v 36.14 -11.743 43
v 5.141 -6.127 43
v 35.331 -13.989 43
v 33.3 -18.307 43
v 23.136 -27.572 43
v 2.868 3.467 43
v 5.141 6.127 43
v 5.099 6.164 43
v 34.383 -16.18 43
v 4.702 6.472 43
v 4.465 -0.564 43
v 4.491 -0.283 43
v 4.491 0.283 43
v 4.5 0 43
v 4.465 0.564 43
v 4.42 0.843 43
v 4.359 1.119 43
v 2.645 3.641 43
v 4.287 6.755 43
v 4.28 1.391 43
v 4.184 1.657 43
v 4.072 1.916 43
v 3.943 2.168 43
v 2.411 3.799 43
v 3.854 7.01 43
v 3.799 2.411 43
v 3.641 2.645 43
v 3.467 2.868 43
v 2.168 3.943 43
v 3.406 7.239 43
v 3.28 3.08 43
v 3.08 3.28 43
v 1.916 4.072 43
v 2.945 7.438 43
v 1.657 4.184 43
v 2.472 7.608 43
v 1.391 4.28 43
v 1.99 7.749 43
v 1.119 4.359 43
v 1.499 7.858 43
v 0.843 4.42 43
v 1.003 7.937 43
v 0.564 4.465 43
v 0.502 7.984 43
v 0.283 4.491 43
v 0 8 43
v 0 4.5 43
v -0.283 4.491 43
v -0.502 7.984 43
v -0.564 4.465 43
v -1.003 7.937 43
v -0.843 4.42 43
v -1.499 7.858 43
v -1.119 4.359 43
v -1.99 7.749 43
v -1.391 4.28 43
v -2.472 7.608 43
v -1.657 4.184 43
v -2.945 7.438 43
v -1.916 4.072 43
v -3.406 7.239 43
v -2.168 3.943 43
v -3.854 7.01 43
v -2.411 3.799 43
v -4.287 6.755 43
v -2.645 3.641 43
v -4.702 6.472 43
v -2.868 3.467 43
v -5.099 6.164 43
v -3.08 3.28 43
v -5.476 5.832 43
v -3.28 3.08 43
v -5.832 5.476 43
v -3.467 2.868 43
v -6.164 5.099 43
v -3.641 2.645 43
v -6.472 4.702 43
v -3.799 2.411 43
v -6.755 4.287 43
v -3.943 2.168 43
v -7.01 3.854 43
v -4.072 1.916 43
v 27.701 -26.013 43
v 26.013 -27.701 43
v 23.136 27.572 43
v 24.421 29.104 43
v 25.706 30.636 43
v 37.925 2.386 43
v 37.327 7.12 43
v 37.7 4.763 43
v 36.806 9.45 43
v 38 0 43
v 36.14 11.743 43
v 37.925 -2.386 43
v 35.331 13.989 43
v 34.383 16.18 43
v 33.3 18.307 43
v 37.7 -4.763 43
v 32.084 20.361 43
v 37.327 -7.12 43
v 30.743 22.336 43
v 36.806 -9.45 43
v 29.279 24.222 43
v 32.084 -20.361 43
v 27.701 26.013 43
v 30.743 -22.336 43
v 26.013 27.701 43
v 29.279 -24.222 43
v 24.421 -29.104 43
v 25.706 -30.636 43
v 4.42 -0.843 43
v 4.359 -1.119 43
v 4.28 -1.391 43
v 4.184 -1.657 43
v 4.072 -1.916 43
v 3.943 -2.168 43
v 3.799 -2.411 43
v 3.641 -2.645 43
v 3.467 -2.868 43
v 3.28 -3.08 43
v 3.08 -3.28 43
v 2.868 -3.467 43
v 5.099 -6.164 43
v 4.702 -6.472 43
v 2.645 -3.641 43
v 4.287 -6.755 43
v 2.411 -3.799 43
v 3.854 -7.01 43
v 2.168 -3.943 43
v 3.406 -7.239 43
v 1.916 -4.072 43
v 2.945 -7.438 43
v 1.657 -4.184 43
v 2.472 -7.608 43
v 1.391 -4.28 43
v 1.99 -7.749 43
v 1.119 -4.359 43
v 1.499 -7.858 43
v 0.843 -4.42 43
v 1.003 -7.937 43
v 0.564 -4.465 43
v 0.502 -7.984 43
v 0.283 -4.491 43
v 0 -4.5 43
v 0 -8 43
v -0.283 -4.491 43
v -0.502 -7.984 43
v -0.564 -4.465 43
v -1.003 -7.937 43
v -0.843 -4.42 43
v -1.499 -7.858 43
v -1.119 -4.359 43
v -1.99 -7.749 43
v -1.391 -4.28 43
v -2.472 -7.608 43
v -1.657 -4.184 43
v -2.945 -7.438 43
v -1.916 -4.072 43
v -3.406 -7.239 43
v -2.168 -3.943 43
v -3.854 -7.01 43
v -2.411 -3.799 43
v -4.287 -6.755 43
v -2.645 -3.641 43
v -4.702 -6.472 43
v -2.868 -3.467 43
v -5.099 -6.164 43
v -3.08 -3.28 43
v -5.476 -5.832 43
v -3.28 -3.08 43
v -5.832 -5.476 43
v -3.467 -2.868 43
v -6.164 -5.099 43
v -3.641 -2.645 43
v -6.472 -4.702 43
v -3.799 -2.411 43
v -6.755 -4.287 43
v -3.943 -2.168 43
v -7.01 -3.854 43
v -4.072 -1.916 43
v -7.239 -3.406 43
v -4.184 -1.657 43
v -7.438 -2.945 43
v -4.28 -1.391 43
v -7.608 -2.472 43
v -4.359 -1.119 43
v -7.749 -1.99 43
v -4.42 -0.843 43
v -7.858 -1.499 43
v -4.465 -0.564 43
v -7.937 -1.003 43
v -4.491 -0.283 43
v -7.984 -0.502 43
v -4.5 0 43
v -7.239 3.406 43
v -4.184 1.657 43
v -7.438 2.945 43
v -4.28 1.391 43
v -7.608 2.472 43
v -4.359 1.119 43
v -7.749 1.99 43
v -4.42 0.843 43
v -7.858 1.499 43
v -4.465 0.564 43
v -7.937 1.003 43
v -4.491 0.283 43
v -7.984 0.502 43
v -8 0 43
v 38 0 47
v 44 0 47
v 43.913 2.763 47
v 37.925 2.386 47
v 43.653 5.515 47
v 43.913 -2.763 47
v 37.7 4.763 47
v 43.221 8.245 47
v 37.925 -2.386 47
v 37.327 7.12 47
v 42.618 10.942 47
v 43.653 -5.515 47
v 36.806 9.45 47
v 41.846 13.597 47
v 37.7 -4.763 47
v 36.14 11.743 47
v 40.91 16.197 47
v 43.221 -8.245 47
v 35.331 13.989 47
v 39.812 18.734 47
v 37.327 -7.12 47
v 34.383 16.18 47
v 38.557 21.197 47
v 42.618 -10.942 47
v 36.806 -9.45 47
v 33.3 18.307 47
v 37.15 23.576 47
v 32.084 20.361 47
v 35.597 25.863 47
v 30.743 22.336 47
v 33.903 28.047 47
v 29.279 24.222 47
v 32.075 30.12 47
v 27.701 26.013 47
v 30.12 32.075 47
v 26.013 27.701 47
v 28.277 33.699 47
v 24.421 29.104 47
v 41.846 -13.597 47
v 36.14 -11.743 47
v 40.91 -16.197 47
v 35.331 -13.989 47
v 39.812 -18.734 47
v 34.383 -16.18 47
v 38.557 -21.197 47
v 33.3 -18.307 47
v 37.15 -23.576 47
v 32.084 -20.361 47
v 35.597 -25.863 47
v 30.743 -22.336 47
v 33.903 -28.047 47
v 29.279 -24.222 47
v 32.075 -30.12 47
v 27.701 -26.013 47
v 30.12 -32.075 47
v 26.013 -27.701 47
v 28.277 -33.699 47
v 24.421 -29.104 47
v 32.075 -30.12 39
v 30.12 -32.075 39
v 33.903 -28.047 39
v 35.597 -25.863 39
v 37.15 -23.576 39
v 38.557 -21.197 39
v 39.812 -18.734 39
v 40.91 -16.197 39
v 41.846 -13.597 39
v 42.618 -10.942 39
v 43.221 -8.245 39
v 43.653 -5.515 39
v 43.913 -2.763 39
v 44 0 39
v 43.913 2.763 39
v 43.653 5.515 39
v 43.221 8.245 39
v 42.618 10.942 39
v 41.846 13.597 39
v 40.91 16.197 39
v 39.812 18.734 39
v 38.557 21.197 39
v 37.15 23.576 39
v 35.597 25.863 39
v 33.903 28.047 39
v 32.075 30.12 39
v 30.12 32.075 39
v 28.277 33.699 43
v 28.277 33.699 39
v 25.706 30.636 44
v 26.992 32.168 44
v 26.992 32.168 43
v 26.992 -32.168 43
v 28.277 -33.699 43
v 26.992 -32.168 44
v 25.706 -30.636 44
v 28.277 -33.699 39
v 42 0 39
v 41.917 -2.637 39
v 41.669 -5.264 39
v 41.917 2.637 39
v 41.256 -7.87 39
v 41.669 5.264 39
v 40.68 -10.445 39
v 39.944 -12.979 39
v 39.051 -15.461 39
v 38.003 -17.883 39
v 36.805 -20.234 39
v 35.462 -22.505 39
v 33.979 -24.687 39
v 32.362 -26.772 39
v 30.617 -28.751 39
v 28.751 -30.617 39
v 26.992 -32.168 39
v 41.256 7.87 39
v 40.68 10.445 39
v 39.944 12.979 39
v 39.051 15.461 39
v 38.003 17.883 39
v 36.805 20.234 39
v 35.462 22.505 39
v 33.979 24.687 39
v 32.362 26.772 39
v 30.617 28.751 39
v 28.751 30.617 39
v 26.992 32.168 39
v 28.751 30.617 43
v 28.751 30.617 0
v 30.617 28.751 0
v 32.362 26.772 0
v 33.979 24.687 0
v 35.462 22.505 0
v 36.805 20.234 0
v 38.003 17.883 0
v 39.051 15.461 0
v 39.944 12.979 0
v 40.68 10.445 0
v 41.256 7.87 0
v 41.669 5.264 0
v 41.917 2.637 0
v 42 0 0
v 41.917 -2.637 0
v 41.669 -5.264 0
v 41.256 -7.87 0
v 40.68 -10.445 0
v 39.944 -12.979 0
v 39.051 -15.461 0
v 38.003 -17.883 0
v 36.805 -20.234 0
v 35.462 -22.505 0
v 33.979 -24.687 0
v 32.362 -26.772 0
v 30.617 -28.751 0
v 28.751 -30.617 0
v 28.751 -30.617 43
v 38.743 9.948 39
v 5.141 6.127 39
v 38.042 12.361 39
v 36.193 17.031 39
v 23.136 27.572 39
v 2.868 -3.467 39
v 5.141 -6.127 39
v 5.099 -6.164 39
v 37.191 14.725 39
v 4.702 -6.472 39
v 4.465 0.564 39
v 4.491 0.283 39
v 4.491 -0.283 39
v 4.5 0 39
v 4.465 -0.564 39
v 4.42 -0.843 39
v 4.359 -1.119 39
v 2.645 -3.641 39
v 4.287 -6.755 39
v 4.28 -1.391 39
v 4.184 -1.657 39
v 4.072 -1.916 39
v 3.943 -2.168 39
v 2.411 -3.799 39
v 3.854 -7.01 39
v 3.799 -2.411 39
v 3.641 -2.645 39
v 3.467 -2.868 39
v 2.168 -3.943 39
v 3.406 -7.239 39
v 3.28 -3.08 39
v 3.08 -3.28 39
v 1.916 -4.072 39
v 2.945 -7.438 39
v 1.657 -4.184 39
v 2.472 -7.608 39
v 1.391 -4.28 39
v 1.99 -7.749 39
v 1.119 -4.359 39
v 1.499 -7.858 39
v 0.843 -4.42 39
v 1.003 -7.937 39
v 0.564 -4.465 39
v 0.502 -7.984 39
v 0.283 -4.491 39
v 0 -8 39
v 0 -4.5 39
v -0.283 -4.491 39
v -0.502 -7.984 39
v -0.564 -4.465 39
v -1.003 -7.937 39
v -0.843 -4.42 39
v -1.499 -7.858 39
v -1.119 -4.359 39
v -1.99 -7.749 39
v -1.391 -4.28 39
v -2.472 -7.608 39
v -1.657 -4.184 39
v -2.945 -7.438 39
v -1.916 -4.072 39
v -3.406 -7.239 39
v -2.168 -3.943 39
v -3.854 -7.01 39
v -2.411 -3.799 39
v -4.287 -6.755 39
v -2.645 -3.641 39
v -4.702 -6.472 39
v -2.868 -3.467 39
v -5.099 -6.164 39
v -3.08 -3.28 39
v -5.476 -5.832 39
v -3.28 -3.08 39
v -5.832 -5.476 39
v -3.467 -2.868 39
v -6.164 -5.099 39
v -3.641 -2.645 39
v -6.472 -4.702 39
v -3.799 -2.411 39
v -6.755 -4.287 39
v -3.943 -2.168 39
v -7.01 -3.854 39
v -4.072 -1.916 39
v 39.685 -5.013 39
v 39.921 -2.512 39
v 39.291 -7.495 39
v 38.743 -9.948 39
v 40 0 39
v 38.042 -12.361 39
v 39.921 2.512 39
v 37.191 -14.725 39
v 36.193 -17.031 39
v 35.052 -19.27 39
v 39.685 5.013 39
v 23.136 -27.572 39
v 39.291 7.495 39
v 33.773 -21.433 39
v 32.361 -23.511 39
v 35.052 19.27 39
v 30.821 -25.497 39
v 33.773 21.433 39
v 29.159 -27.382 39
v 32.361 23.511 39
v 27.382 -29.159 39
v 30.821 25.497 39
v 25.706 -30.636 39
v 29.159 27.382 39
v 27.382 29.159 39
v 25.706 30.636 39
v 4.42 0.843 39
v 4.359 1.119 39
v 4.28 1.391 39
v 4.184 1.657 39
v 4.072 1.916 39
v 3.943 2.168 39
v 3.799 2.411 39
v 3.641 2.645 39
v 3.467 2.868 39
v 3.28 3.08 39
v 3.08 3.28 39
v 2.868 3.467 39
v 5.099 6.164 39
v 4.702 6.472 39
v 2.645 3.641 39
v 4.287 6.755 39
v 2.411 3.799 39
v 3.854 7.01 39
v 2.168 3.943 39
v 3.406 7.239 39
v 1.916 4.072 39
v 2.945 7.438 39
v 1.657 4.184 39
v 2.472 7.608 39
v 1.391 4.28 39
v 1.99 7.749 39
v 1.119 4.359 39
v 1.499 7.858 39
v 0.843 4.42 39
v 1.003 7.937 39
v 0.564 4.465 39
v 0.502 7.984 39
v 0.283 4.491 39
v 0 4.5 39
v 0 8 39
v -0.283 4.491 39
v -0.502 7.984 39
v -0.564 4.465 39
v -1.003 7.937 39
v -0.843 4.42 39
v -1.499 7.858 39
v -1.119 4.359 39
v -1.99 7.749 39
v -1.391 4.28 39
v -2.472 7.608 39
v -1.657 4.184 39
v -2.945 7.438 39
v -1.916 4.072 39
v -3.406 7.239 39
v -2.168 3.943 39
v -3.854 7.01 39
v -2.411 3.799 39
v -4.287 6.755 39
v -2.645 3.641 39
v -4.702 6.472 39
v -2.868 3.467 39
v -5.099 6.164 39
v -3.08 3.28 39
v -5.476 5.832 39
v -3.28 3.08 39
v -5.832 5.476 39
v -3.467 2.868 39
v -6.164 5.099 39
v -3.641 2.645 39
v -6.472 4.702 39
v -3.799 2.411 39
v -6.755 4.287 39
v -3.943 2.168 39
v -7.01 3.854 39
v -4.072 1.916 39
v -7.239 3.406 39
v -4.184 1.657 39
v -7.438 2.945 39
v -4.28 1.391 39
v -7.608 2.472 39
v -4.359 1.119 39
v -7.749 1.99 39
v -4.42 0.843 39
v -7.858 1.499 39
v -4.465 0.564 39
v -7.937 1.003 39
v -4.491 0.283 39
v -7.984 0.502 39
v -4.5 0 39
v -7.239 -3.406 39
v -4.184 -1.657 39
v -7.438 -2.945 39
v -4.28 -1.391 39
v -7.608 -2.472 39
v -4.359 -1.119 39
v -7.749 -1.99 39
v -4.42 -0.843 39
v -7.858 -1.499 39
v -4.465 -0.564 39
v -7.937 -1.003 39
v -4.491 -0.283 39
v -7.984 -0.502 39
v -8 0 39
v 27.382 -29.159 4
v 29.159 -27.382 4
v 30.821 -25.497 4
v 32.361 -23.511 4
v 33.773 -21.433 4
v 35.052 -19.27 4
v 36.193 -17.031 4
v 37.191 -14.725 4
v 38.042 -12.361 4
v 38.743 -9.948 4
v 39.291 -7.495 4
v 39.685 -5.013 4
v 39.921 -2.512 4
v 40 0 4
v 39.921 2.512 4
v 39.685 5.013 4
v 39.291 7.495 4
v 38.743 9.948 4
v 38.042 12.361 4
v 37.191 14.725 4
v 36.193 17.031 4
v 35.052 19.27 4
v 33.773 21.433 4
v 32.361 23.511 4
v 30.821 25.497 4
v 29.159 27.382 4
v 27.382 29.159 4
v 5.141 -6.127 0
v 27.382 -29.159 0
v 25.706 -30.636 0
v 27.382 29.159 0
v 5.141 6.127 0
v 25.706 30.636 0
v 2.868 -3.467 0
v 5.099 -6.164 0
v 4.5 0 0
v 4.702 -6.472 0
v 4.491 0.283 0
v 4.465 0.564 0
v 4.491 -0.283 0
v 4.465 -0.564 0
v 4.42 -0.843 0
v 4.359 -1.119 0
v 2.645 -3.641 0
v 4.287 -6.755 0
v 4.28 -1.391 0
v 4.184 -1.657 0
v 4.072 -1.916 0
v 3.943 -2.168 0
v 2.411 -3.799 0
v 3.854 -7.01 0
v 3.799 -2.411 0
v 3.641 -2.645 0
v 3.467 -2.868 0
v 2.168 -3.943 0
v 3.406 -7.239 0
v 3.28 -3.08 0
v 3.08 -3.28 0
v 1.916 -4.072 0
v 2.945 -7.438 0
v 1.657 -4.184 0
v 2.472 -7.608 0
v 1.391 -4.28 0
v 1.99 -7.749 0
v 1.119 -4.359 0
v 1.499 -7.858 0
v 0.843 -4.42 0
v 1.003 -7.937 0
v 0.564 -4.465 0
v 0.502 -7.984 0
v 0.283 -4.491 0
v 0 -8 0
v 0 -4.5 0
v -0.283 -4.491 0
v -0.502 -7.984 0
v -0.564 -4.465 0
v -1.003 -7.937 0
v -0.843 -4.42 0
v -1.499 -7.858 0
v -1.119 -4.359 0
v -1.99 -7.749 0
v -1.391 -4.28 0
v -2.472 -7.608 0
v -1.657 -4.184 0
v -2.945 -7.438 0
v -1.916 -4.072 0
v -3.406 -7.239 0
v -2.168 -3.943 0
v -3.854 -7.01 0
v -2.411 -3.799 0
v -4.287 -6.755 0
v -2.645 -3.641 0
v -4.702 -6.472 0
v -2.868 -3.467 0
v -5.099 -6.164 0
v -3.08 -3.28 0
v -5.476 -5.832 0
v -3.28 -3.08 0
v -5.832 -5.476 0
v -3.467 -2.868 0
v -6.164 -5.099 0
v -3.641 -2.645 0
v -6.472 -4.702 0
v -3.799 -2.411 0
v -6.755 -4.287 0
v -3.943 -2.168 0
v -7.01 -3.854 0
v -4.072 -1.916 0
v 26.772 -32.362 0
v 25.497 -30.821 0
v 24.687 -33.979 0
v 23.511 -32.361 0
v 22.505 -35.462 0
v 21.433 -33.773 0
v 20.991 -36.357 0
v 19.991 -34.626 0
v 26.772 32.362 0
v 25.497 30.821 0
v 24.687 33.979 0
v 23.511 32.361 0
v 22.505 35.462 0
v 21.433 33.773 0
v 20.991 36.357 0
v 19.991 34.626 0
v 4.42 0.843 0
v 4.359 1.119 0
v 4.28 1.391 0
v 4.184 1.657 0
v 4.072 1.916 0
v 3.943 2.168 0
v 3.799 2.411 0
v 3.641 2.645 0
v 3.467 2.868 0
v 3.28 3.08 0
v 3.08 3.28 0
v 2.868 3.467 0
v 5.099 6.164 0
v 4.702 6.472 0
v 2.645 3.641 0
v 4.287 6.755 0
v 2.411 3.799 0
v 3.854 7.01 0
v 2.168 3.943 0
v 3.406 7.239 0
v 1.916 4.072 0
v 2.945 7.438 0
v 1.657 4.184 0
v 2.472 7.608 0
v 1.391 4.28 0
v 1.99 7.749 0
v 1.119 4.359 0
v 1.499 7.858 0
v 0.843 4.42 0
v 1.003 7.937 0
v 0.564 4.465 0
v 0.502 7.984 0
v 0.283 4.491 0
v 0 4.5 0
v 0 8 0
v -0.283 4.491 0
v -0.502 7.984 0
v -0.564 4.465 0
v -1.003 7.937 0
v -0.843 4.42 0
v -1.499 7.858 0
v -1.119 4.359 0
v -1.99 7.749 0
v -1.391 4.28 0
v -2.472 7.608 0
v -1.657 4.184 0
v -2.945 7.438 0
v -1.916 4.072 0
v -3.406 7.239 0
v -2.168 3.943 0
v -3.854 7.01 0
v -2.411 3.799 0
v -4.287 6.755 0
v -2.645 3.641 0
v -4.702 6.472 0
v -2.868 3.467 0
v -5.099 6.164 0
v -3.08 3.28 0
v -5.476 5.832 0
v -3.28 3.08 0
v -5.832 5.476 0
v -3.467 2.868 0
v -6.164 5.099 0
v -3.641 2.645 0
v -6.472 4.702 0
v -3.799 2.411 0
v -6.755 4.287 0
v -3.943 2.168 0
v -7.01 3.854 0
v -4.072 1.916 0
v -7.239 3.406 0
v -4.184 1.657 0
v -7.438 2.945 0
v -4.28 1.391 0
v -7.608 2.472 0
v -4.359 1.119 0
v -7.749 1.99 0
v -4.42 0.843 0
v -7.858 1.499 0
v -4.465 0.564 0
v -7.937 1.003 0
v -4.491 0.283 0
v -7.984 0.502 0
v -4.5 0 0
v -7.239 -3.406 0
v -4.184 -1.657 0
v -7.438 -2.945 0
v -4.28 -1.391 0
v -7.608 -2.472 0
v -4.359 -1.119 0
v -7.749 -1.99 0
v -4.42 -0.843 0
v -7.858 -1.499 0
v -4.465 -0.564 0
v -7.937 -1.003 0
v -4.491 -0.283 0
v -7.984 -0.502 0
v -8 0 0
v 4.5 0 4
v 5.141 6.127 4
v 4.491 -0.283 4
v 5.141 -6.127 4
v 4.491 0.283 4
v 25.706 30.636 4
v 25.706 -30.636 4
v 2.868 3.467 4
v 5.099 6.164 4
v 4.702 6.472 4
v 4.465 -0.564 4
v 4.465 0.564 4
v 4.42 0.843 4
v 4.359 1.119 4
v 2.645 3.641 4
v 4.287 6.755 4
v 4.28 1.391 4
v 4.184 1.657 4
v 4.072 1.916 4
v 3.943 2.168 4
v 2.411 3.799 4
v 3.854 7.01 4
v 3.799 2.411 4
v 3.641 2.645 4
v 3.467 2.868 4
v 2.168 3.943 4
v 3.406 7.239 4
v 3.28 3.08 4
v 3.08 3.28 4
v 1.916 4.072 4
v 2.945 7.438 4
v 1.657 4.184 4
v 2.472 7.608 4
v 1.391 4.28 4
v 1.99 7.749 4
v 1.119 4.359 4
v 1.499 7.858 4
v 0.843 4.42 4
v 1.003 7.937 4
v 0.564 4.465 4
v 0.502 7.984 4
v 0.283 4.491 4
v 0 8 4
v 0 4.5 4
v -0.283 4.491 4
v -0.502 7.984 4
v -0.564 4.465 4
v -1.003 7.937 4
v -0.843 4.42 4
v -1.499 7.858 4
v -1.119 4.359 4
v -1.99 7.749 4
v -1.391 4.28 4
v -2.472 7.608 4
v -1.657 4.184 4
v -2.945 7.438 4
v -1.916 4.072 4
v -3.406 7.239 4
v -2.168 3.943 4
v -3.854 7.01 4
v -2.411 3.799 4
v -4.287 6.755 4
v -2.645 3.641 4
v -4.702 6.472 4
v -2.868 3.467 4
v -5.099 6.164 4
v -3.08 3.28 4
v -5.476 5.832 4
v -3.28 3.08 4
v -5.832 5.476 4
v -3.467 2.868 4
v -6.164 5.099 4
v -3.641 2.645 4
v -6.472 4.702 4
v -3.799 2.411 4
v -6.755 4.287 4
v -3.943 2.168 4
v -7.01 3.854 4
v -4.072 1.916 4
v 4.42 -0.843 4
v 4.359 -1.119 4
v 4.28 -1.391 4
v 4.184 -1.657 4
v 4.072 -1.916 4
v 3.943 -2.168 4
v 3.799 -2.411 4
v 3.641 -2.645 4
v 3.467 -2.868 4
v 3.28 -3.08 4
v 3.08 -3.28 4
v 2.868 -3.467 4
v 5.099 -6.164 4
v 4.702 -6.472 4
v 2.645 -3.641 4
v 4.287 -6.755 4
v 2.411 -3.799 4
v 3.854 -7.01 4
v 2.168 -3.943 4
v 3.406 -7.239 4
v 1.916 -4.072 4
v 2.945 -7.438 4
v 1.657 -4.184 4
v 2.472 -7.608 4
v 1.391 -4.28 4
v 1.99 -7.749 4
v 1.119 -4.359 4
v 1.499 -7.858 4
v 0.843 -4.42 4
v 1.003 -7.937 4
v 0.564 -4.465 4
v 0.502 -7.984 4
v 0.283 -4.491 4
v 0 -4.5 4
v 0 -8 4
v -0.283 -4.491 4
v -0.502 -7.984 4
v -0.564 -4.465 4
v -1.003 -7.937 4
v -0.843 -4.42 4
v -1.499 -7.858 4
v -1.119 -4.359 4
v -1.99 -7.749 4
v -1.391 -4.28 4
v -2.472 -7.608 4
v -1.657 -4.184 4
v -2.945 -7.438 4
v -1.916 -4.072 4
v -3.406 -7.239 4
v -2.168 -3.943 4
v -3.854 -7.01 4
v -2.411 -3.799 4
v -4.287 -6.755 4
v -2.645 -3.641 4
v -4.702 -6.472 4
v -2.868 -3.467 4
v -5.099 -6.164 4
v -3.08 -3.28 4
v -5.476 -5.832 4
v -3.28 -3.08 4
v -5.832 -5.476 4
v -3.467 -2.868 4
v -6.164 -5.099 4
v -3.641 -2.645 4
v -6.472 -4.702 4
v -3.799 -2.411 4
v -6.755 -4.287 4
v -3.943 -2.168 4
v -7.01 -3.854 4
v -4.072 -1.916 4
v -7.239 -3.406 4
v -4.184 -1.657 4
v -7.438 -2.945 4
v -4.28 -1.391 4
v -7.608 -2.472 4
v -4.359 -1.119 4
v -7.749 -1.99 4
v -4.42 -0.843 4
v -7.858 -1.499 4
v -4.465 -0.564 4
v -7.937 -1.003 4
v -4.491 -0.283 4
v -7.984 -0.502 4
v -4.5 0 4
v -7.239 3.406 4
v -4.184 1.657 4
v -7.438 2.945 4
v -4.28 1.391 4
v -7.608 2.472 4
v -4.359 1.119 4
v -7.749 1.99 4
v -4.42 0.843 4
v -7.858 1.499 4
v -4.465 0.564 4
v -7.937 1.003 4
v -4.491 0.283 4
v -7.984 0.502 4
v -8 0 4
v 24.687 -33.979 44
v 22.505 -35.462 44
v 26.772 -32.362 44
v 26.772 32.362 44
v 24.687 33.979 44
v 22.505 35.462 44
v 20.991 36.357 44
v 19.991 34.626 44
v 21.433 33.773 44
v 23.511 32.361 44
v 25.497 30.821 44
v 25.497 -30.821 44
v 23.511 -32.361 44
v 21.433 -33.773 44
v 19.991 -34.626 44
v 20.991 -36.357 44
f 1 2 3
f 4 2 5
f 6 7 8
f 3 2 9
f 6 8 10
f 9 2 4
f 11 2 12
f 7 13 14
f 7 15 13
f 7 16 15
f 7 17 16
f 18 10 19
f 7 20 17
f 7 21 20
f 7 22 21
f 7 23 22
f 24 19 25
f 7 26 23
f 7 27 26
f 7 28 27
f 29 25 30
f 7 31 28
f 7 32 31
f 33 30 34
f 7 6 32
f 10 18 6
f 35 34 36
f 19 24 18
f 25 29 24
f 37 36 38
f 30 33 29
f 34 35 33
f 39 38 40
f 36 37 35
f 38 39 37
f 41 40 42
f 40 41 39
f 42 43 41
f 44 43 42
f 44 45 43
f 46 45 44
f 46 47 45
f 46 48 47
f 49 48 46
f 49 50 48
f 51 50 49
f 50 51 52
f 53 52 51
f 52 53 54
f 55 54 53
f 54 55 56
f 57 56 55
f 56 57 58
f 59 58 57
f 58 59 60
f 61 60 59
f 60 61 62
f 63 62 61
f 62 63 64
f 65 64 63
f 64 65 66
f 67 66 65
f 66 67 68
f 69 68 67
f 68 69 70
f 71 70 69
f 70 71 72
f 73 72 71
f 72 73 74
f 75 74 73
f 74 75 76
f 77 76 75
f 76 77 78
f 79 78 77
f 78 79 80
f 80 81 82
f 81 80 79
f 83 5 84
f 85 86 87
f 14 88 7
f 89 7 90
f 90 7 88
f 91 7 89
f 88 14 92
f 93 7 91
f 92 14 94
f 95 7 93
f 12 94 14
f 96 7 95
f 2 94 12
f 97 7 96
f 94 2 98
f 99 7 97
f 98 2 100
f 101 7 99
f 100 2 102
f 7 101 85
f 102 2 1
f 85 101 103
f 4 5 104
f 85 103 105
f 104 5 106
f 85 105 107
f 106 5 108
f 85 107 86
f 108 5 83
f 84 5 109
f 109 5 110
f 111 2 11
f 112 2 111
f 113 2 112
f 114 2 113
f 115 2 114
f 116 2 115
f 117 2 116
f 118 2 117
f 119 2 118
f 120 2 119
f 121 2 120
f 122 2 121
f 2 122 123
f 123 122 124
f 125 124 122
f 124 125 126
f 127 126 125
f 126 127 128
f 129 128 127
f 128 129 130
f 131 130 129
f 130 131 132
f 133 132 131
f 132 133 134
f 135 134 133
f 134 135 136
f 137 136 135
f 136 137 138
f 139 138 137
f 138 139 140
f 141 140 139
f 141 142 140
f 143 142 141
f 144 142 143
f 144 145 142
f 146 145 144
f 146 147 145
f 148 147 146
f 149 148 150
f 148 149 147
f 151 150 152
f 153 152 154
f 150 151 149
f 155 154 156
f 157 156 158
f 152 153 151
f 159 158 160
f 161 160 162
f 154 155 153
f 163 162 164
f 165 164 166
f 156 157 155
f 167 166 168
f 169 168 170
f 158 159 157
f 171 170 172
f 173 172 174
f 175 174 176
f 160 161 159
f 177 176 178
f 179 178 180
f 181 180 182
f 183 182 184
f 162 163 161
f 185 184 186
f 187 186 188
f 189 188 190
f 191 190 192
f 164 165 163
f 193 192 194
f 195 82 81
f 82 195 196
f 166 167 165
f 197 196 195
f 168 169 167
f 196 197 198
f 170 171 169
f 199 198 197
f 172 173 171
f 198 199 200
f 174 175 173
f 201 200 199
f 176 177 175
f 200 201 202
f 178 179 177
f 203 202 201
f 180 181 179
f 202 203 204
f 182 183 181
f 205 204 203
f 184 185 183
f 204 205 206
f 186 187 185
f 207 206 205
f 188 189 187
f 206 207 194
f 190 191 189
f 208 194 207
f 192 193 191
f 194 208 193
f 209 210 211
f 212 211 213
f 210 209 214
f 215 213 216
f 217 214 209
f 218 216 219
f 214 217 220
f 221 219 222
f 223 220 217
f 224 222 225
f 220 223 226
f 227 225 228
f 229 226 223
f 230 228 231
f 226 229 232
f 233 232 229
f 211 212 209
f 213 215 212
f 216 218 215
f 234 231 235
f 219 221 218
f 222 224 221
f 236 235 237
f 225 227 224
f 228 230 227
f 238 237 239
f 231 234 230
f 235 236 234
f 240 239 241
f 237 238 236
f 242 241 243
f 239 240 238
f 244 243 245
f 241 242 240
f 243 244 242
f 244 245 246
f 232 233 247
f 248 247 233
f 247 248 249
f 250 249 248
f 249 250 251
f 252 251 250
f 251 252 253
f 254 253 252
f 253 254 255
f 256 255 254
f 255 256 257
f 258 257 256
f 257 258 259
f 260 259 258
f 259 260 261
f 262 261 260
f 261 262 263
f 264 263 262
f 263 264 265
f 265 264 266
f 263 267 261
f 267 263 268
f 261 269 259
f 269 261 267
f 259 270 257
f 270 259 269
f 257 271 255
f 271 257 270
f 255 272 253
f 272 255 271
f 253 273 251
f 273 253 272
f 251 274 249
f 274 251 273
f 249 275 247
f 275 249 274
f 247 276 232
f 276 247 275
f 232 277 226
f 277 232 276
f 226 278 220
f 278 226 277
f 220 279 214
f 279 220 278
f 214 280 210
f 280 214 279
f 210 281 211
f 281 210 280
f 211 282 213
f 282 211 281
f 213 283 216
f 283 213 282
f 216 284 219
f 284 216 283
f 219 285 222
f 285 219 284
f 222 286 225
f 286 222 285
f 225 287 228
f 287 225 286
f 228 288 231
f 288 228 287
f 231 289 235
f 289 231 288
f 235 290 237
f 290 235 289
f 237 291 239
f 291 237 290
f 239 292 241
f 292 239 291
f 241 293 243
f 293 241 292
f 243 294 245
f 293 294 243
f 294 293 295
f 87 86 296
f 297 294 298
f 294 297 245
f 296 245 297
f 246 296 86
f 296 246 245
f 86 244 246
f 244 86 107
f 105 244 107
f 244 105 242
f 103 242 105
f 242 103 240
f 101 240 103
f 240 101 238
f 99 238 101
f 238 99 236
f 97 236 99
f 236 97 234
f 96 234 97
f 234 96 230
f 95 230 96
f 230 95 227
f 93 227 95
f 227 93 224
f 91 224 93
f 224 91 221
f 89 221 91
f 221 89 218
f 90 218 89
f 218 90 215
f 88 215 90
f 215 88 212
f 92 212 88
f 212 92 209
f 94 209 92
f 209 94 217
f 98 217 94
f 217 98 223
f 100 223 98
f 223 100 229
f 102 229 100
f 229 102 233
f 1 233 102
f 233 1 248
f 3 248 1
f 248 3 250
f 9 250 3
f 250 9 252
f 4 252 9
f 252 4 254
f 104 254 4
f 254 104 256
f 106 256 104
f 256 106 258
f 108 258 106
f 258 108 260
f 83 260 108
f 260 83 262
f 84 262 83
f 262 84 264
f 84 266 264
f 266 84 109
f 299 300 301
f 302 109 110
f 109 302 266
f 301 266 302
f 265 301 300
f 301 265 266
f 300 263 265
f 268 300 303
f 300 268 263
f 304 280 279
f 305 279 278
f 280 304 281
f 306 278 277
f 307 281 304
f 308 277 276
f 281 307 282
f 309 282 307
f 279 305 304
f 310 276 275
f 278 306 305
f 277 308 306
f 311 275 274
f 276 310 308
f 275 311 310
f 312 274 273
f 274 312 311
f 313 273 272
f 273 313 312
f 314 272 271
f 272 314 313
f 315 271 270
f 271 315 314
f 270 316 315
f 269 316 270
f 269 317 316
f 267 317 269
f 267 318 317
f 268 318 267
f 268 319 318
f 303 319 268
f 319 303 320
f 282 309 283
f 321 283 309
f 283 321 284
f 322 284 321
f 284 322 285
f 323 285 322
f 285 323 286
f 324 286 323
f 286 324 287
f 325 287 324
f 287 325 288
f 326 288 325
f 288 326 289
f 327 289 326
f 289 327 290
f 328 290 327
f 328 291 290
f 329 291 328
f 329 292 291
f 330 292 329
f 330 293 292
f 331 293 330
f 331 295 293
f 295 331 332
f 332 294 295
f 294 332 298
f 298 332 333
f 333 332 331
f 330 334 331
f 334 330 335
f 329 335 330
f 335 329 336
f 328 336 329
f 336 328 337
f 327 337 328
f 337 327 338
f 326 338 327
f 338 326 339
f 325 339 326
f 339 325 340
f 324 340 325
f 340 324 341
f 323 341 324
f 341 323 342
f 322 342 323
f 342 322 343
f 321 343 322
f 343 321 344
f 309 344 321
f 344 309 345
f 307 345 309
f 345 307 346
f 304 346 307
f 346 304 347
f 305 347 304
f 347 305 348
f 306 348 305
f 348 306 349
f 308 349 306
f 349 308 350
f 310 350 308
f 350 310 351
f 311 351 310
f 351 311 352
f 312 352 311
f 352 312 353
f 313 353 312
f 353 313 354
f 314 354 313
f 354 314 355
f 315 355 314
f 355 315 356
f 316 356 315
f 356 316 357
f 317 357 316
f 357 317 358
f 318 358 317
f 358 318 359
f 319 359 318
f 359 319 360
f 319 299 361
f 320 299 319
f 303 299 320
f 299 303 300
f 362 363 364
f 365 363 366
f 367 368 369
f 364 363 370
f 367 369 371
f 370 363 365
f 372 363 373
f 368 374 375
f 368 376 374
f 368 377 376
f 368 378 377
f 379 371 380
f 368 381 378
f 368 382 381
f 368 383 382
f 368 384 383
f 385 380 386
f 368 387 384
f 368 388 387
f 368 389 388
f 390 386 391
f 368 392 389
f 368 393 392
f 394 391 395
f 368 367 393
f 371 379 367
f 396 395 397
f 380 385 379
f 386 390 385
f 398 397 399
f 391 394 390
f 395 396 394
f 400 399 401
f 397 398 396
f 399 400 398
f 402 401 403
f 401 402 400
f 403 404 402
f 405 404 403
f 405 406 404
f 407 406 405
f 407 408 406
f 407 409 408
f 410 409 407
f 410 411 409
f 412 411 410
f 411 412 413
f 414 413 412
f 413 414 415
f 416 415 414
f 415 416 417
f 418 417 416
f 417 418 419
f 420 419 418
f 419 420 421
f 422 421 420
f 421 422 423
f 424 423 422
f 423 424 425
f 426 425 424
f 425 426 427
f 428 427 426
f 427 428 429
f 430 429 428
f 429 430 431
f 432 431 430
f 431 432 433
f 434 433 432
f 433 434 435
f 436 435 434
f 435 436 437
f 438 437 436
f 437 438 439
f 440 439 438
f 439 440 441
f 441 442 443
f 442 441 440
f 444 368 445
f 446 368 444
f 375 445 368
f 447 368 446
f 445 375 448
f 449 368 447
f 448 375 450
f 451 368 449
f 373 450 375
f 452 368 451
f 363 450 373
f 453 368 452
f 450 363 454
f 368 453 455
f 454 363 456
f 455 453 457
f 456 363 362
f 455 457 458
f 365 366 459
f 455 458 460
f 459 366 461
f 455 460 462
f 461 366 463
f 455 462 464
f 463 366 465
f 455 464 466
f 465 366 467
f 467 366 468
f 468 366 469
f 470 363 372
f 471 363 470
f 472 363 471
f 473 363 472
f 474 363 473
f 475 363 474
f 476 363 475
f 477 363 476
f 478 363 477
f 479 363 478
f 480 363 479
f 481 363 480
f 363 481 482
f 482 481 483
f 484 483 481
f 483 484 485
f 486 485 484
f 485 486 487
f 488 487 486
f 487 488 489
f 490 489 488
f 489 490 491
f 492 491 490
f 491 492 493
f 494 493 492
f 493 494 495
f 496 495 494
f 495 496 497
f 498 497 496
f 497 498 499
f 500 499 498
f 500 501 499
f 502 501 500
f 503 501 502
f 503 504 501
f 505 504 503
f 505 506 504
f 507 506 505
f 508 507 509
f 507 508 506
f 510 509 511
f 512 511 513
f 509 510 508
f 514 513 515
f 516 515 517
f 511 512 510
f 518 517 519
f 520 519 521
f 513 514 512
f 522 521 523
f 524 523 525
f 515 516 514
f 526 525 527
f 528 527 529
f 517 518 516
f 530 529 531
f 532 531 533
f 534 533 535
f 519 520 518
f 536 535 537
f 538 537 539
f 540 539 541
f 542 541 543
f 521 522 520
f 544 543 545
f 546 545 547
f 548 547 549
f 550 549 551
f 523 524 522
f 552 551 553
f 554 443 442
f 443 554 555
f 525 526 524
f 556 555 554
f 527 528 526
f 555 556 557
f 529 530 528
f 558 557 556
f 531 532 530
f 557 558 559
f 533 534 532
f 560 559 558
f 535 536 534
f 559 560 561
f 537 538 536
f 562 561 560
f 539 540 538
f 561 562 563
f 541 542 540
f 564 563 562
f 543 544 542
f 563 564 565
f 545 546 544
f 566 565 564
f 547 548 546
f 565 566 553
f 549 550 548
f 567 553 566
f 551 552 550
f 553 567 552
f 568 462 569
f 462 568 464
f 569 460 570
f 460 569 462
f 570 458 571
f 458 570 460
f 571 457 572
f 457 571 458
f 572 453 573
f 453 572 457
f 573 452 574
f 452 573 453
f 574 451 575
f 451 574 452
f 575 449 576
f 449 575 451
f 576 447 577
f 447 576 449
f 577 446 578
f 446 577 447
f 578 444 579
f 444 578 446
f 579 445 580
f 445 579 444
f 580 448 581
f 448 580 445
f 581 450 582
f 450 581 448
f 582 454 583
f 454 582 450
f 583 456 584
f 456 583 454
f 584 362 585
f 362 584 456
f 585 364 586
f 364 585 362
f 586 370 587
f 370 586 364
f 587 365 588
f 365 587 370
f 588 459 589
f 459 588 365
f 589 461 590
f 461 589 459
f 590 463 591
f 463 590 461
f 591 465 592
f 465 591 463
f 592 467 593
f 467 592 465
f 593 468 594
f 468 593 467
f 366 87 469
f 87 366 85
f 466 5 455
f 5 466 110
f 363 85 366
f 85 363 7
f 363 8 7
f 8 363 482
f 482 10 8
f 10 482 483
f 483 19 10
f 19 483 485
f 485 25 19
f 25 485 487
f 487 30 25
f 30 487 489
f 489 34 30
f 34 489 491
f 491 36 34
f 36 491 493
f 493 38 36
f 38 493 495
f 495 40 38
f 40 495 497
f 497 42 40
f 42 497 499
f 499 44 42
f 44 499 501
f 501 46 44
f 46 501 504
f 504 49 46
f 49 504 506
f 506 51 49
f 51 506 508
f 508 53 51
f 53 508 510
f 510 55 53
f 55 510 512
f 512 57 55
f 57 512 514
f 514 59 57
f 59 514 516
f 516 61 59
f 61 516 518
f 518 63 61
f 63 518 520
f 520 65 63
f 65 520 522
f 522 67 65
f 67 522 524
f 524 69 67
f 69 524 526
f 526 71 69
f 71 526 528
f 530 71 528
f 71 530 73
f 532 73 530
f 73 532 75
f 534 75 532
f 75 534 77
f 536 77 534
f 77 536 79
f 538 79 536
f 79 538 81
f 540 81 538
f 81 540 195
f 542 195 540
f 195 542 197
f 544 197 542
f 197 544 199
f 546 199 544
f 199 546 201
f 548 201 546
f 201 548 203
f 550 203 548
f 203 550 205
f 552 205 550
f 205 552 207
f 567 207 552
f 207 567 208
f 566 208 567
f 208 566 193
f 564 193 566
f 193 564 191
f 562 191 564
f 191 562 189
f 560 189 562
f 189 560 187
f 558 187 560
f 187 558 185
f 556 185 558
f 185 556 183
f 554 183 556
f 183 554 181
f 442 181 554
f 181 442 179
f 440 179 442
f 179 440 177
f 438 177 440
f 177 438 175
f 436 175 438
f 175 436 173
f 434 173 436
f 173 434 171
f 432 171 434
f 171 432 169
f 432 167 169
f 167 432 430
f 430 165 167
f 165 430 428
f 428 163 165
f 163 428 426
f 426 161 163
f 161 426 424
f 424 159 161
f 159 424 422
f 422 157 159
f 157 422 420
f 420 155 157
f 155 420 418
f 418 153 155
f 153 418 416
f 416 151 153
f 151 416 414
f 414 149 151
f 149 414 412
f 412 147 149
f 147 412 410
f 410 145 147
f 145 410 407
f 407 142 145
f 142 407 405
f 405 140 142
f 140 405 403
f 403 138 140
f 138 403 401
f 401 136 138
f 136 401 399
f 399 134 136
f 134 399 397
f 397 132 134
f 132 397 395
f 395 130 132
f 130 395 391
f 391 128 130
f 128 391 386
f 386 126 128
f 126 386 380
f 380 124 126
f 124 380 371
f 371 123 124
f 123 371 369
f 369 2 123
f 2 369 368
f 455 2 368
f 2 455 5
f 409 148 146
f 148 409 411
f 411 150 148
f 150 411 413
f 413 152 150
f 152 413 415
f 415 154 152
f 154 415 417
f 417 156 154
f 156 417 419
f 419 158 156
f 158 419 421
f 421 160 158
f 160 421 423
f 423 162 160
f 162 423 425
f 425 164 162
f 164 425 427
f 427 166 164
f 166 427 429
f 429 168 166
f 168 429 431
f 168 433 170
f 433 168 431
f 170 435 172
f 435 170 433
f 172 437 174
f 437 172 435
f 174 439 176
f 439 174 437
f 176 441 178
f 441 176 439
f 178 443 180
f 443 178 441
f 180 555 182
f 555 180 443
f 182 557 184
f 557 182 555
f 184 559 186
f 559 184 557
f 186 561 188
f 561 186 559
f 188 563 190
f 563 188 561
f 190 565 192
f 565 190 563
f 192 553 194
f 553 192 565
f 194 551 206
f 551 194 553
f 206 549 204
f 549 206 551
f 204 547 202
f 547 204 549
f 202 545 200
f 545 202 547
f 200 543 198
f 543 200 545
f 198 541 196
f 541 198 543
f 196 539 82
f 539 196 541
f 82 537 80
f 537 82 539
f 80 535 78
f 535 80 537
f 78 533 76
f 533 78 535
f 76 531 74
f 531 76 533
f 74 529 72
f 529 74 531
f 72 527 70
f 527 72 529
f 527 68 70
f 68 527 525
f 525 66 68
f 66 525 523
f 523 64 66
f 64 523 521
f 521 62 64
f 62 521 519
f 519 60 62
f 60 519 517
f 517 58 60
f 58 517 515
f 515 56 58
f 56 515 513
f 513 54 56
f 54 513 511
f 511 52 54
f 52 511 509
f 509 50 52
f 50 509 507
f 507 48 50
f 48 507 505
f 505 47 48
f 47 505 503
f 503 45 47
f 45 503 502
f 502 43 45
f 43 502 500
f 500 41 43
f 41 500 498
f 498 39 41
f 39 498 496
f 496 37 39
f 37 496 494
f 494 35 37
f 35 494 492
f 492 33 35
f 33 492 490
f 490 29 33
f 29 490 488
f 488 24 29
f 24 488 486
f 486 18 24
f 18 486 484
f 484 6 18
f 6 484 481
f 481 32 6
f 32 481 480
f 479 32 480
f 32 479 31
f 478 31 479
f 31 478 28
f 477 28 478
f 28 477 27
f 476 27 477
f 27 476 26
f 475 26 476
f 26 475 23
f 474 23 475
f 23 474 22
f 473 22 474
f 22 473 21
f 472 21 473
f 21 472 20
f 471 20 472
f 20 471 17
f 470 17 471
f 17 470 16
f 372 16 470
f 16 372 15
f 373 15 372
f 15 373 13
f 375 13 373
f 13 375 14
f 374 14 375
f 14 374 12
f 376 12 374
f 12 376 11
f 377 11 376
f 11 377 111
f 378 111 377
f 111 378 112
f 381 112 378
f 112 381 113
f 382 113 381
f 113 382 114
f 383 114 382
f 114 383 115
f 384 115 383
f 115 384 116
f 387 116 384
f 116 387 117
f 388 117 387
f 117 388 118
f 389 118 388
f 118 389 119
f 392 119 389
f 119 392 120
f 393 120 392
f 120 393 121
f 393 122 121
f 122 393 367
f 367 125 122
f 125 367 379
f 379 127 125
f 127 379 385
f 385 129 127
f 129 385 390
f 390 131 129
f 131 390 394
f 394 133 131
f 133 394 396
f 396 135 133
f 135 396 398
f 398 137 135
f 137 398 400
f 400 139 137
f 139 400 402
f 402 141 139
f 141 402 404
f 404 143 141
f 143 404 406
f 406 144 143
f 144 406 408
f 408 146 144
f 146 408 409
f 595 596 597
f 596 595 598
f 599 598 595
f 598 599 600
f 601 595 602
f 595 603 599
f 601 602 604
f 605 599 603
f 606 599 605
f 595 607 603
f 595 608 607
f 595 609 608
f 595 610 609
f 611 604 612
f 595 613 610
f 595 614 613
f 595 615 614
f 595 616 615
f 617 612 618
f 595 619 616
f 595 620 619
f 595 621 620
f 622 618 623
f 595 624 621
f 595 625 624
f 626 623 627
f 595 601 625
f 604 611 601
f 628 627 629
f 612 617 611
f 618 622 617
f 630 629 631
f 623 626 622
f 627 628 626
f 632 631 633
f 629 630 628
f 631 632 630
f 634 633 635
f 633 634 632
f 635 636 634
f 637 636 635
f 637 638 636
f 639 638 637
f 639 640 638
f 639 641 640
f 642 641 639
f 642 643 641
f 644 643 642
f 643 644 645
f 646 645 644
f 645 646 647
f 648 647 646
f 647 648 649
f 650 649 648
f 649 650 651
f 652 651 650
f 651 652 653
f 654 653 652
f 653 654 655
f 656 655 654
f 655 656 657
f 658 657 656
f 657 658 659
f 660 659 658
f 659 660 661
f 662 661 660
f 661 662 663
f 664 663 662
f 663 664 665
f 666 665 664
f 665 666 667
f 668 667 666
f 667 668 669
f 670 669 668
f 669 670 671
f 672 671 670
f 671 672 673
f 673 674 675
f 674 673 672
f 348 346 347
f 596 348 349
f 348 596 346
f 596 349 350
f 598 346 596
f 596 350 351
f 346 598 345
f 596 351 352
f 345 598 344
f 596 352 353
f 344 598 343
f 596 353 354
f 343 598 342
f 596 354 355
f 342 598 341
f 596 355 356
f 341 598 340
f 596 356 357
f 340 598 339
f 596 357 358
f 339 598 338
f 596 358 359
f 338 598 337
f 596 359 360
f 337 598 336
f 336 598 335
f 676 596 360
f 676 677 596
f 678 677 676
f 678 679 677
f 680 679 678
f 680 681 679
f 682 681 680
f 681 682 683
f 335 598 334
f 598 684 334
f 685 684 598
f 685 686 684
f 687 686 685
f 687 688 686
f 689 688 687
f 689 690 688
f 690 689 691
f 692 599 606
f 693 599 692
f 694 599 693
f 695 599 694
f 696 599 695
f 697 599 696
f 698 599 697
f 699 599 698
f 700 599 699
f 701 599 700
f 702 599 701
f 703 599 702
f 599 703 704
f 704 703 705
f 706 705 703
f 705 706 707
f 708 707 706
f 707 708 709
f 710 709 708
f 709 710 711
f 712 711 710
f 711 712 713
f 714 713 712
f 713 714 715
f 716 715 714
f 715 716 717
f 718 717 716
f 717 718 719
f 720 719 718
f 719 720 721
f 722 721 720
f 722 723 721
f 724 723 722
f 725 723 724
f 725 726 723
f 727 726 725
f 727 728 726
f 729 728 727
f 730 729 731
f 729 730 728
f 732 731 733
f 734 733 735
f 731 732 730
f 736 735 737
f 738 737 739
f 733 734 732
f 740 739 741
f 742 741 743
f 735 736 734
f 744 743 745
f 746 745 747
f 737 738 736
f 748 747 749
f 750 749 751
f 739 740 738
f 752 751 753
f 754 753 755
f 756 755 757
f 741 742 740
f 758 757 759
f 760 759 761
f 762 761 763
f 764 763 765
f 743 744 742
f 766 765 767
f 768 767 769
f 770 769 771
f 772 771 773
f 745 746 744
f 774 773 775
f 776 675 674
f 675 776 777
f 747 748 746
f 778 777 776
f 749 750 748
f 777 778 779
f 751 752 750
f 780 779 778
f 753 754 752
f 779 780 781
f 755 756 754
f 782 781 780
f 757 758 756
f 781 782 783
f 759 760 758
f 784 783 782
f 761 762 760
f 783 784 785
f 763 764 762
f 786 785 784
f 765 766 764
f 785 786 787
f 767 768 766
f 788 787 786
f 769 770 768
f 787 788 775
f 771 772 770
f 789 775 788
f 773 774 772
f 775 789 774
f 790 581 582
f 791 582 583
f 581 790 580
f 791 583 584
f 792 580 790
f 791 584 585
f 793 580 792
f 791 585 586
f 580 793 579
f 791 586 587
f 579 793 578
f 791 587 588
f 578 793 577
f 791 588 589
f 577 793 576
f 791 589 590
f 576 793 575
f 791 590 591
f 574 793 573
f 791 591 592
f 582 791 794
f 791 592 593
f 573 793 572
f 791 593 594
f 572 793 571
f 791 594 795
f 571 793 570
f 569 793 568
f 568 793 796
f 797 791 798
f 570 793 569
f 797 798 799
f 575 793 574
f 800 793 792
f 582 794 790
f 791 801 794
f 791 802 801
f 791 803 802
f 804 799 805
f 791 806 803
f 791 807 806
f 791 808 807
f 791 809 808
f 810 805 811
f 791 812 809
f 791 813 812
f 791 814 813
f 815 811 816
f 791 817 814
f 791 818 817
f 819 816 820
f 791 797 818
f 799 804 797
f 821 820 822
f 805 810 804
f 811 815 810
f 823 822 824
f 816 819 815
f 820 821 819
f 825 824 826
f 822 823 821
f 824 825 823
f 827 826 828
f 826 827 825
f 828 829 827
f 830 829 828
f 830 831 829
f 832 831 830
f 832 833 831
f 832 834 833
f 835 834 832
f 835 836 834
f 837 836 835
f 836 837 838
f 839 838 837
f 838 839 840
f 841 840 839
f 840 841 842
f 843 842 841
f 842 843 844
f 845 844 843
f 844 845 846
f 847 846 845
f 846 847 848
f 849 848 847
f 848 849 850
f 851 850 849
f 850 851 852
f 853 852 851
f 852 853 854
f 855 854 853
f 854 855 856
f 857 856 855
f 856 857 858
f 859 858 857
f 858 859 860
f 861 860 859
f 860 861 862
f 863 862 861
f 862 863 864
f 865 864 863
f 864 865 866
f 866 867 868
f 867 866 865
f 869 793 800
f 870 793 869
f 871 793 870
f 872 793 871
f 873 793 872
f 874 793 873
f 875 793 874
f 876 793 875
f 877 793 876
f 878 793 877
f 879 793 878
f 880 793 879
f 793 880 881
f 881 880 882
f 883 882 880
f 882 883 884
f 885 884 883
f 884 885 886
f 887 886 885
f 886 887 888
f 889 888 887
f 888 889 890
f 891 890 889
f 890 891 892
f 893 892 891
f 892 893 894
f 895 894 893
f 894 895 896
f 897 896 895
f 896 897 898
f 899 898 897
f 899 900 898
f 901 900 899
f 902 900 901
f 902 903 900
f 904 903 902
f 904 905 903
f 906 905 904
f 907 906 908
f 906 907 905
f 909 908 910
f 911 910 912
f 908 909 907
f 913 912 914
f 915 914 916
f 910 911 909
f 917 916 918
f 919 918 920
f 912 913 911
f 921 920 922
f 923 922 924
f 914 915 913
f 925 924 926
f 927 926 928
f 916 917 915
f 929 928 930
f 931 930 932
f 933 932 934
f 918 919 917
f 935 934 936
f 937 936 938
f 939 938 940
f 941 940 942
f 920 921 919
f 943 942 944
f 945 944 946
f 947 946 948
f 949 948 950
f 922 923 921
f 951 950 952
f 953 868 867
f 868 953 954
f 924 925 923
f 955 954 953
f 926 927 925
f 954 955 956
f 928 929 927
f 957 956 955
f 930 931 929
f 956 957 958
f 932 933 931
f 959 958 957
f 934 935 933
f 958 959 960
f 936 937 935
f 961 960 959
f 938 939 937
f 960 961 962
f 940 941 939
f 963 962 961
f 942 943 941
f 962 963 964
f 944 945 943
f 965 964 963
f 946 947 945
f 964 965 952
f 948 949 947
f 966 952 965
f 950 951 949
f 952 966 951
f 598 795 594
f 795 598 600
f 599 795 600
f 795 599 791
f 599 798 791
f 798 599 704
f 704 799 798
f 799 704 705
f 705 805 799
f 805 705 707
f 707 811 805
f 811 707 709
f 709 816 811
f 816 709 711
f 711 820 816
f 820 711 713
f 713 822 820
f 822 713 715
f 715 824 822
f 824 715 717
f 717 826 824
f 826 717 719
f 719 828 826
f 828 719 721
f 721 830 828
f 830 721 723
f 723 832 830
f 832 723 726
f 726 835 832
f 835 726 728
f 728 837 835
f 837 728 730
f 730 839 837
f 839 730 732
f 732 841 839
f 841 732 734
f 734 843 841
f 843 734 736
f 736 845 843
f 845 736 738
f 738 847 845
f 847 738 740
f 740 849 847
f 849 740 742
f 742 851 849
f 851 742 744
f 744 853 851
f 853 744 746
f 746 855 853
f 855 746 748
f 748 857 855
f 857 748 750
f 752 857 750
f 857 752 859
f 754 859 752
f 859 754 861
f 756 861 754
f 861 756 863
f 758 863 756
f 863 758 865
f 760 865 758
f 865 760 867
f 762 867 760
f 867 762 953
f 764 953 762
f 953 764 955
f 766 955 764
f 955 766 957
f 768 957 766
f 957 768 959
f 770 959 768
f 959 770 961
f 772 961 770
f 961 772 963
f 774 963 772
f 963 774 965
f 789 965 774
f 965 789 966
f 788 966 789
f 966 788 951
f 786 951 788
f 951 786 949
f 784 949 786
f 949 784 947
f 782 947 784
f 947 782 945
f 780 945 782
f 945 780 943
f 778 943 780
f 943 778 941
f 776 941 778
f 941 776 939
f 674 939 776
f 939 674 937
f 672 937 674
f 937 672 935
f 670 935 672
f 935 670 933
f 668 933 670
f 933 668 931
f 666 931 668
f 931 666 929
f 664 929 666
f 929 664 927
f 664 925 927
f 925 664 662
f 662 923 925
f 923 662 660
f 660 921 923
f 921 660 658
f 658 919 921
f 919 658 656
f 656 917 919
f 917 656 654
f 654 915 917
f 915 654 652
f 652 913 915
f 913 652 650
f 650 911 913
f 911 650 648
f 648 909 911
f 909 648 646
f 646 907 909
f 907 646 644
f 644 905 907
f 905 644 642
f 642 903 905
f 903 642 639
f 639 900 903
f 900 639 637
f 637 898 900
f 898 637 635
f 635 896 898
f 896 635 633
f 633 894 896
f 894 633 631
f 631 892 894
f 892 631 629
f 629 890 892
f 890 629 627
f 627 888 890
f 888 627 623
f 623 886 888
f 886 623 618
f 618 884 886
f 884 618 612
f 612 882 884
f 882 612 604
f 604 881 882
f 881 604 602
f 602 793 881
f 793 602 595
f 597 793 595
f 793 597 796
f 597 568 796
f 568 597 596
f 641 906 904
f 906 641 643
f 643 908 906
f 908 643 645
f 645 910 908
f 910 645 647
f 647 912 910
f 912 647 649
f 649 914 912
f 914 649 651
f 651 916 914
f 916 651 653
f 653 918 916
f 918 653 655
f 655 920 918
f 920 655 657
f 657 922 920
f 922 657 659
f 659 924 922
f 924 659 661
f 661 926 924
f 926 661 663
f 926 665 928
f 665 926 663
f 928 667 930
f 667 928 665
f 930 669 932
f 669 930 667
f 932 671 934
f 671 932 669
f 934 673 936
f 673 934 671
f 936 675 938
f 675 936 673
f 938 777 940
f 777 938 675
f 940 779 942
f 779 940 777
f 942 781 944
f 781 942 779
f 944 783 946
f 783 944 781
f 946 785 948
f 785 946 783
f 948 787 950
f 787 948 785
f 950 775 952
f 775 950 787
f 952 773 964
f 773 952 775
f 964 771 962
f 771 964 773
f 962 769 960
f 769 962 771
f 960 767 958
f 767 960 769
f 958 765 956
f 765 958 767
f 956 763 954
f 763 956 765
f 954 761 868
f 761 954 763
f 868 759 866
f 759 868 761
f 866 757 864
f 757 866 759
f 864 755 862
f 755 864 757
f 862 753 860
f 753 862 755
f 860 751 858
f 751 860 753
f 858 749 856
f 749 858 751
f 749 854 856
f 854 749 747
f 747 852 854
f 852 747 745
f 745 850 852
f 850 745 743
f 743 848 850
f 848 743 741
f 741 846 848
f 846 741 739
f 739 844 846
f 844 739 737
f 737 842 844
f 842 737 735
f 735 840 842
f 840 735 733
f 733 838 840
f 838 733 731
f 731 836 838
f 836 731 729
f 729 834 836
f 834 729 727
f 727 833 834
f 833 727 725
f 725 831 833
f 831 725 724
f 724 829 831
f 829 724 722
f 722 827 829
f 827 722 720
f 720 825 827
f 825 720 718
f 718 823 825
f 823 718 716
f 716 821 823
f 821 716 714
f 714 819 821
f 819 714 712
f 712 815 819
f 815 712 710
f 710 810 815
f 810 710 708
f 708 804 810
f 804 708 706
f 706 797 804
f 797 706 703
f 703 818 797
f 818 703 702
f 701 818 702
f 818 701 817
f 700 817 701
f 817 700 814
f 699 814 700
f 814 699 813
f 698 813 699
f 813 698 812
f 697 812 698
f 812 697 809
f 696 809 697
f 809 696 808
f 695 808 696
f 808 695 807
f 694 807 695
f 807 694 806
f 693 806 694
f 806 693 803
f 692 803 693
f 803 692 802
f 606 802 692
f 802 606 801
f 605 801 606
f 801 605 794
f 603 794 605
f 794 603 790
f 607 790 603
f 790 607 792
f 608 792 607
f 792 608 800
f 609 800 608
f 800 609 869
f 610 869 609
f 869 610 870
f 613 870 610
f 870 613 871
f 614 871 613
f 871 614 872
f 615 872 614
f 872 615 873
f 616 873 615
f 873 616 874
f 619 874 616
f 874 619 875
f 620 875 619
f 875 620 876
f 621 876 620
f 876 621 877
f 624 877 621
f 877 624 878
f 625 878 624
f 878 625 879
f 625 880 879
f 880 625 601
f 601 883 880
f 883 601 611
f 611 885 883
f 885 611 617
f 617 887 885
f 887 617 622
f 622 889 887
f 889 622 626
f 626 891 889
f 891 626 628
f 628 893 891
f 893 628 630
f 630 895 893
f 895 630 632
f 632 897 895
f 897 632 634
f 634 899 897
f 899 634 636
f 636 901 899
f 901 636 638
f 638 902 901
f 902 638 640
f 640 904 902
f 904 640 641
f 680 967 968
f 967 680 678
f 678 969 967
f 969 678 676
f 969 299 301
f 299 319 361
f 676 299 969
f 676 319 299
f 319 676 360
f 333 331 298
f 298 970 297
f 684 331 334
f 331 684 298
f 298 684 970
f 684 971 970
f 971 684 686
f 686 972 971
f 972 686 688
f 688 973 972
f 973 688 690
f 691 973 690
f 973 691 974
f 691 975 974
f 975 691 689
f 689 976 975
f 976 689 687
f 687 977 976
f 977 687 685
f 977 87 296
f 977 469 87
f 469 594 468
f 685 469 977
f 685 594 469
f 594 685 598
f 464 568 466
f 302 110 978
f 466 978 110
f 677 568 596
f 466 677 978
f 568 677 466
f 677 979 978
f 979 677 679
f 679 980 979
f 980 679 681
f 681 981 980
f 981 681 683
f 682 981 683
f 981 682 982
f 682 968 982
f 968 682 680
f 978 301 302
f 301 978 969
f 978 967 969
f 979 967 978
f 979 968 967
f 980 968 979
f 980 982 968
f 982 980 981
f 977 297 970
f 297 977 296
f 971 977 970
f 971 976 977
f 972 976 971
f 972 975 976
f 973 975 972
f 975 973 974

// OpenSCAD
// file: ic--mekanizma.scad
module pizza_cut(bottom_padding = 0 , diameter = 100, cut_angle = 0, start_angle = 0, end_angle = 45, extension = 1.5, thickness = 35, bore_multipier = 6, cone_height = 50, $fn = 100) {
    animation_angle = $t * 360;

    translate([thickness / 2, 0, bottom_padding + diameter / 2])
    rotate([0, 270, 0])
    rotate([0, 0, (animation_angle + cut_angle) % 360])
    difference() {
        linear_extrude(height = thickness) {
            union() {
            difference() {
                // Daire
                circle(d = diameter, $fn = $fn);
                
                // Pizza dilimi şekliq
                polygon(points = [
                    [0, 0], 
                    [diameter * extension * cos(start_angle), diameter * extension * sin(   start_angle)],
                    [diameter * extension * cos(end_angle), diameter * extension * sin(end_angle)]
                ]);
                        
            }
        
            circle(6,  $fn = $fn);
        }
    }
        shelve_cut(bore_multipier = bore_multipier, thickness = thickness);
    }
}

module circle_with_circle_cut(bottom_padding = 0 , diameter = 100, cut_angle = 0, start_angle = 0, end_angle = 45, extension = 1.5, thickness = 35, bore_multipier = 6, cone_height = 50, $fn = 100) {
    animation_angle = $t * 360;

    translate([thickness / 2, 0, bottom_padding + diameter / 2])
    rotate([0, 270, 0])
    rotate([0, 0, (animation_angle + cut_angle)])
    difference() {
        linear_extrude(height = thickness) {
            union() {
            difference() {
                // Daire
                circle(d = diameter, $fn = $fn);
 
                translate([21, 0, 0])
                scale([3, 4, 1])
                    circle(d = 13, $fn = 100); // Elips
                        
            }
        
            circle(6,  $fn = $fn);
        }
    }
        shelve_cut(bore_multipier = bore_multipier, thickness = thickness);
    }
}

module shelve_cut(bore_multipier = 1, thickness) {
        translate([bore_multipier / -2, bore_multipier / -2, -2]) 
            cube([bore_multipier, bore_multipier, thickness + 4]);
}


module circle_part(diameter = 80, height = 10, angle = 90, bottom_padding = 0, extension = 1.5) {
    translate([-(diameter / 2), -( diameter / 2)])
    rotate_extrude(angle=angle)
    offset(r=2, $fn=100) offset(r=-2) square([diameter,height]);
}


circle_part();

//circle_with_circle_cut(diameter = 80, thickness = 35, start_angle = -45, end_angle = 45); 
// main file
use <ic--mekanizma.scad>;

$fn = 100; // Çemberin düzgünlüğü
diameter = 80; // Dairenin çapı
angle = 50; // Pizza dilimi açısı (her iki yöne simetrik olarak)
wall = 4;

depth = 35 + wall * 2 + 1;

outer_diameter = diameter + wall; // Dış çemberin çapı

module part_wall_with_slice(diameter = diameter) {
    linear_extrude(wall) {
        difference() {
            union() {
                difference() {
                    pizza_slice(diameter = diameter);
                    pizza_slice(cut_angle = 47, diameter = diameter + 10);
                }
                circle(8,  $fn = $fn);
            }

            circle(4.5,  $fn = $fn);
        }
    }
}

module part_wall() {
    linear_extrude(wall) {
        difference() {
            union() {
                pizza_slice();
                circle(8,  $fn = $fn);
            }

            circle(4.5,  $fn = $fn);
        }
    }
}

module pizza_slice(cut_angle = angle, diameter = diameter) {
        intersection() {
            circle(d = diameter); // Ana daire
            polygon(points = [
                [0, 0], 
                [diameter * 1.5 * cos(-cut_angle), diameter * 1.5 * sin(-cut_angle)],
                [diameter * 1.5 * cos(cut_angle), diameter * 1.5 * sin(cut_angle)]
            ]); // Dilim kesici üçgen
        }
    
}

module pizza_wall(angle = angle, diameter = diameter, outer_diameter = outer_diameter) {
    difference() {
        intersection() {
            // Dış çember
            circle(d = outer_diameter);
            // Pizza dilimini sınırlayan açı
            polygon(points = [
                [0, 0], 
                [outer_diameter * cos(-angle), outer_diameter * sin(-angle)],
                [outer_diameter * cos(angle), outer_diameter * sin(angle)]
            ]);
        }
        // İç çemberi çıkararak duvar oluştur
        circle(d = diameter);
    }
}

module top_part() {
    linear_extrude(wall) {
        pizza_wall(diameter = diameter - wall * 2, outer_diameter = diameter);
    }

    //part_wall_with_slice(diameter = diameter - wall);

    linear_extrude(wall) {
        difference() {
            union() {
                difference() {
                    pizza_slice(diameter = diameter);
                    //pizza_slice(cut_angle = 47, diameter = diameter + 10);
                }
                circle(8,  $fn = $fn);
            }

            circle(4.5,  $fn = $fn);
        }
    }

    // asil par.a vvuarina tutturmak icin
    union() {
        translate([0, 0, wall])
        linear_extrude(wall) {
            pizza_wall(diameter = diameter - wall, outer_diameter = outer_diameter + wall);
        }
    
        linear_extrude(wall) {
            pizza_wall(diameter = outer_diameter, outer_diameter = outer_diameter + wall);
        }
    }
}


//part_wall_with_slice(diameter = diameter - wall);

module hopper_v2() {
    linear_extrude(height = 20) {
    difference() {
        union() {
                difference() {
                    pizza_slice(cut_angle = 47, diameter = diameter - wall);
                    pizza_slice(cut_angle = 45, diameter = diameter - wall * 2);
                }

                circle(8,  $fn = $fn);
            }
        circle(4.5,  $fn = $fn);

        }                          
    }
}

module top_part_v2() {
    part_wall();
    linear_extrude(wall) {
        pizza_wall(angle = 60);
    }
    linear_extrude(depth) {
        pizza_wall(angle = 60);
    }
}
module hopper() {

hopper_size = 85;
chord_length = 2 * 40 * sin(30);

difference() {
    // dis yuzey
    translate([depth+35, 0, 0])
    rotate([0, 270, 0])
    linear_extrude(
        height = depth, 
        scale=[
            (chord_length + 2 * wall) / (hopper_size + 2 * wall), 
            (chord_length + 2 * wall) / (hopper_size + 2 * wall)
        ]
    ) {
        square([hopper_size + wall, hopper_size + wall], center = true);
    }


    // ic kesit
translate([depth+35, 0, 0])
rotate([0, 270, 0])
linear_extrude(height = depth, scale=[chord_length / hopper_size, chord_length / hopper_size]) {
    square([hopper_size, hopper_size], center = true);
}

    translate([0,0,-50])
linear_extrude(100) {
pizza_slice(cut_angle = 30);
}

}
}

translate([0,0, 35 + 4])
top_part();

//pizza_wall(angle = 30, diameter = diameter + 10);
top_part_v2();

//pizza_slice(cut_angle = 45, diameter = diameter - 4);



/*
linear_extrude(depth) {
    difference() {
        pizza_wall(angle = 60);
        pizza_wall(angle = 30, diameter = diameter);
    }
}
*/

/*
width = 81;

alt_genislik = 35;
alt_genislik2 = 50;

difference() {


translate([30, 0, 0])
rotate([0, 270, 0])
difference() {
    linear_extrude(
        height = 30, 
        scale=[
            (alt_genislik + 4) / (width + 4), 
            (alt_genislik2 + 4) / (width + 4)
            ]
        ) {
        square([width + 4, width + 4]);
    } 

    translate([2, 2])
    linear_extrude(height = 30, scale=[alt_genislik / width, alt_genislik2 / width]) {
        square([width, width]);
    } 
}
*/
    /*

    translate([-31, 28, 0])
    linear_extrude(69) {
        pizza_slice();
    }
}
    */

    
